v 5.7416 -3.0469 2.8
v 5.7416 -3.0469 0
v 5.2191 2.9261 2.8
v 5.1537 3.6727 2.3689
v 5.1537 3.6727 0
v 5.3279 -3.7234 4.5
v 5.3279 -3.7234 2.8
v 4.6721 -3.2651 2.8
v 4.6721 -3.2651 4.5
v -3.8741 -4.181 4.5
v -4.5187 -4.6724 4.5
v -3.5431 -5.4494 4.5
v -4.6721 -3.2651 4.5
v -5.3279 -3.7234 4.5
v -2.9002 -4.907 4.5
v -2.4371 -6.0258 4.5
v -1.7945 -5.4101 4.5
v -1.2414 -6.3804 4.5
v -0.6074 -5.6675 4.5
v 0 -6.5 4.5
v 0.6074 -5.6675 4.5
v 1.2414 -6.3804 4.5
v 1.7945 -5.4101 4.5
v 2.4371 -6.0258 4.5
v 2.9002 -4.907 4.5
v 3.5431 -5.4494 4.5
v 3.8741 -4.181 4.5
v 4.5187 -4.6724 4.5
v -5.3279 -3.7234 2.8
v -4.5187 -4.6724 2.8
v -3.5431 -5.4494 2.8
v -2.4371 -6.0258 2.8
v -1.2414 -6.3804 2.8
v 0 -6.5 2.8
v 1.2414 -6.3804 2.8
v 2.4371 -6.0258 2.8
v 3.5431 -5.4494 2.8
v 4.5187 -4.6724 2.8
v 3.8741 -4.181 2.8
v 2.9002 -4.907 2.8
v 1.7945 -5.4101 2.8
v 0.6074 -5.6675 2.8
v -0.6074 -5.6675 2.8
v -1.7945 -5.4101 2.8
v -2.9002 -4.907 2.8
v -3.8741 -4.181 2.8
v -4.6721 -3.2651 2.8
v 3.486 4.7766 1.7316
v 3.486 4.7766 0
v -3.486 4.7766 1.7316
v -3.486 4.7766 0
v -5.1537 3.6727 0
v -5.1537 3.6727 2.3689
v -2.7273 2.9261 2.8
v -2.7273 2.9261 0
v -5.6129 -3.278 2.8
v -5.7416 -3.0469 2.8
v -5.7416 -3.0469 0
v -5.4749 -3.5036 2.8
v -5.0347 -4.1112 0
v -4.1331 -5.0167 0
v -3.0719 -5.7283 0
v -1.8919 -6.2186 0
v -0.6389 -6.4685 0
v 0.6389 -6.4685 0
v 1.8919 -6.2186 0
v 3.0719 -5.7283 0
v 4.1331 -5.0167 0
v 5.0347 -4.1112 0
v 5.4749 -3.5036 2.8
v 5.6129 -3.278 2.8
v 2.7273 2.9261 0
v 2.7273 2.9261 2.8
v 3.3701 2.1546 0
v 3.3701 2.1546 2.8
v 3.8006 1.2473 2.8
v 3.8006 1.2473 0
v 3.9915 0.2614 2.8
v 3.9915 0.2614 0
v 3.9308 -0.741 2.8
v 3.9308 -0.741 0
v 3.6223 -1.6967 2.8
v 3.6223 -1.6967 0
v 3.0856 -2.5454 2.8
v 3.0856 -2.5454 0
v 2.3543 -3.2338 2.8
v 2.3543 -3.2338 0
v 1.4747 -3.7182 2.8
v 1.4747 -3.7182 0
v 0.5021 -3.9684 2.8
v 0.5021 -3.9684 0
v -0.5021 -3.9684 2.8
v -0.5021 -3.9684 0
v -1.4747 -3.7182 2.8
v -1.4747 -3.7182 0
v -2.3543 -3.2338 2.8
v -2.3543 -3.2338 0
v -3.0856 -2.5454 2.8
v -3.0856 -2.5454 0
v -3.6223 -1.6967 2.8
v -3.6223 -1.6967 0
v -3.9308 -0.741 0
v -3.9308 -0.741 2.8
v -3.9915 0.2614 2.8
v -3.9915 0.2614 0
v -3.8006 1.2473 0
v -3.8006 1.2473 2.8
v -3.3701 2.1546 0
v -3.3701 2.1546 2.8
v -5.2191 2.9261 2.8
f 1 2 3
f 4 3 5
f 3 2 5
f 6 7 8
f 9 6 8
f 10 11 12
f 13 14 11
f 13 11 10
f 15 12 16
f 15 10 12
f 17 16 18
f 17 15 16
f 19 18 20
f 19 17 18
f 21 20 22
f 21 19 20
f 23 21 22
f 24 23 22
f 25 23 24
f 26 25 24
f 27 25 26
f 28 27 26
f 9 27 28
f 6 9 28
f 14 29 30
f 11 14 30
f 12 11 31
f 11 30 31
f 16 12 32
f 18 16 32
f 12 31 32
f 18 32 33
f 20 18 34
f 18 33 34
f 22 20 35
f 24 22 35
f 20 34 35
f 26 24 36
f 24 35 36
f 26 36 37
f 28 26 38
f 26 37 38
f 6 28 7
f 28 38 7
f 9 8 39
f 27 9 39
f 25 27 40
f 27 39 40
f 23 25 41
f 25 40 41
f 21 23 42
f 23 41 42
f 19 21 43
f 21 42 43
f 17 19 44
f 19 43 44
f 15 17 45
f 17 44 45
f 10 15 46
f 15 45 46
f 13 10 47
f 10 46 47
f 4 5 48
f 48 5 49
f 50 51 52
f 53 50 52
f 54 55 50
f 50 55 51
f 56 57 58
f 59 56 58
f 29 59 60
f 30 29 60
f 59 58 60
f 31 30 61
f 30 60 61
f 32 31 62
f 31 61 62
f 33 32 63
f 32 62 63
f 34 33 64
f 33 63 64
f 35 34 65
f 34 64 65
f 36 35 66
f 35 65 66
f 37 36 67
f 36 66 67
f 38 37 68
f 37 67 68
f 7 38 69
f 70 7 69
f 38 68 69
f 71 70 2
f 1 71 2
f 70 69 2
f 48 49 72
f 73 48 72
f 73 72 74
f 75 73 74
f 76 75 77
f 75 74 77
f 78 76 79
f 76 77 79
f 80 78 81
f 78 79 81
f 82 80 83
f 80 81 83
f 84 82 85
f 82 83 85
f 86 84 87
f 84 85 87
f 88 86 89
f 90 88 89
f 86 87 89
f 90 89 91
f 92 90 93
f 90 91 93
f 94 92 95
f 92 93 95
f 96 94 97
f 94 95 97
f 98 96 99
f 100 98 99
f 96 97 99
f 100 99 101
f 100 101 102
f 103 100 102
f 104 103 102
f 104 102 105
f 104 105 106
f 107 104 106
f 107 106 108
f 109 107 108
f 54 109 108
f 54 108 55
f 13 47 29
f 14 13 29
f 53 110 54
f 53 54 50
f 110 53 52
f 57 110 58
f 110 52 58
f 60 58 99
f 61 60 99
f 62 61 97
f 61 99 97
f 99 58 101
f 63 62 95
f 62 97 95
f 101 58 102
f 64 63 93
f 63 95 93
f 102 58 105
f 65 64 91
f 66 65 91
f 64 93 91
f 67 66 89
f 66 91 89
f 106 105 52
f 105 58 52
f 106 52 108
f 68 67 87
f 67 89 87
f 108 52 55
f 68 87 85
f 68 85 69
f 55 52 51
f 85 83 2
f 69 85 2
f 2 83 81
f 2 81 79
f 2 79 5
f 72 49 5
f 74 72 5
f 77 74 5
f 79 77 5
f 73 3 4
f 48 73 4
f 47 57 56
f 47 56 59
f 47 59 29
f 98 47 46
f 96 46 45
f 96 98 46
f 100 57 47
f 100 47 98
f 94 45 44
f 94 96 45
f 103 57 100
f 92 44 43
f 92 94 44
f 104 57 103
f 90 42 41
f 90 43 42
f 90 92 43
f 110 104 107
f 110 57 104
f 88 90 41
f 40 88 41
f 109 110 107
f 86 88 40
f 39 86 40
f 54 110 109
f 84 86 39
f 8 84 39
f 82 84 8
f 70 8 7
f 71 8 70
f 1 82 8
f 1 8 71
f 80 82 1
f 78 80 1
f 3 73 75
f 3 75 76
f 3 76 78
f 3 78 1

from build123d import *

# Parameters (mm, degrees)
F2_DEPTH = 2.8
F4_DEPTH = 1.7
F6_DEPTH = 12.5


# Not quite as in the source:
# - a feature of the source that left no trace in its solid (it failed there, or was rolled back) is left out


with BuildPart() as f2:
    # F1 (on Top) → F2 (new body)
    with BuildSketch(Plane.XY):
        with BuildLine():
            Line((-5.1537473182, 3.6727124144), (-5.7416372565, -3.0469003289))
            ThreePointArc((-5.7416372565, -3.0469003289), (0, -6.5), (5.7416372565, -3.0469003289))
            Line((5.7416372565, -3.0469003289), (5.1537473182, 3.6727124144))
            Line((5.1537473182, 3.6727124144), (3.4859795486, 4.7765922388))
            Line((3.4859795486, 4.7765922388), (2.7272692442, 2.9260899627))
            ThreePointArc((2.7272692442, 2.9260899627), (0, -4), (-2.7272692442, 2.9260899627))
            Line((-2.7272692442, 2.9260899627), (-3.4859795486, 4.7765922388))
            Line((-3.4859795486, 4.7765922388), (-5.1537473182, 3.6727124144))
        make_face()
    extrude(amount=F2_DEPTH)

    # F3 (on face) → F4 (join)
    with BuildSketch(Plane.XY.offset(2.8)):
        with BuildLine():
            Line((-4.6721311475, -3.2651478589), (-5.3278688525, -3.723414225))
            ThreePointArc((-5.3278688525, -3.723414225), (0, -6.5), (5.3278688525, -3.723414225))
            Line((5.3278688525, -3.723414225), (4.6721311475, -3.2651478589))
            ThreePointArc((4.6721311475, -3.2651478589), (0, -5.7), (-4.6721311475, -3.2651478589))
        make_face()
    extrude(amount=F4_DEPTH)

    # F5 (on Right) → F6 (cut, symmetric)
    with BuildSketch(Plane.YZ):
        Polygon((6.7765922388, 2.8), (2.9260899627, 2.8), (6.7765922388, 0.5769114744), align=None)
    extrude(amount=F6_DEPTH, both=True, mode=Mode.SUBTRACT)


solid = f2.part
